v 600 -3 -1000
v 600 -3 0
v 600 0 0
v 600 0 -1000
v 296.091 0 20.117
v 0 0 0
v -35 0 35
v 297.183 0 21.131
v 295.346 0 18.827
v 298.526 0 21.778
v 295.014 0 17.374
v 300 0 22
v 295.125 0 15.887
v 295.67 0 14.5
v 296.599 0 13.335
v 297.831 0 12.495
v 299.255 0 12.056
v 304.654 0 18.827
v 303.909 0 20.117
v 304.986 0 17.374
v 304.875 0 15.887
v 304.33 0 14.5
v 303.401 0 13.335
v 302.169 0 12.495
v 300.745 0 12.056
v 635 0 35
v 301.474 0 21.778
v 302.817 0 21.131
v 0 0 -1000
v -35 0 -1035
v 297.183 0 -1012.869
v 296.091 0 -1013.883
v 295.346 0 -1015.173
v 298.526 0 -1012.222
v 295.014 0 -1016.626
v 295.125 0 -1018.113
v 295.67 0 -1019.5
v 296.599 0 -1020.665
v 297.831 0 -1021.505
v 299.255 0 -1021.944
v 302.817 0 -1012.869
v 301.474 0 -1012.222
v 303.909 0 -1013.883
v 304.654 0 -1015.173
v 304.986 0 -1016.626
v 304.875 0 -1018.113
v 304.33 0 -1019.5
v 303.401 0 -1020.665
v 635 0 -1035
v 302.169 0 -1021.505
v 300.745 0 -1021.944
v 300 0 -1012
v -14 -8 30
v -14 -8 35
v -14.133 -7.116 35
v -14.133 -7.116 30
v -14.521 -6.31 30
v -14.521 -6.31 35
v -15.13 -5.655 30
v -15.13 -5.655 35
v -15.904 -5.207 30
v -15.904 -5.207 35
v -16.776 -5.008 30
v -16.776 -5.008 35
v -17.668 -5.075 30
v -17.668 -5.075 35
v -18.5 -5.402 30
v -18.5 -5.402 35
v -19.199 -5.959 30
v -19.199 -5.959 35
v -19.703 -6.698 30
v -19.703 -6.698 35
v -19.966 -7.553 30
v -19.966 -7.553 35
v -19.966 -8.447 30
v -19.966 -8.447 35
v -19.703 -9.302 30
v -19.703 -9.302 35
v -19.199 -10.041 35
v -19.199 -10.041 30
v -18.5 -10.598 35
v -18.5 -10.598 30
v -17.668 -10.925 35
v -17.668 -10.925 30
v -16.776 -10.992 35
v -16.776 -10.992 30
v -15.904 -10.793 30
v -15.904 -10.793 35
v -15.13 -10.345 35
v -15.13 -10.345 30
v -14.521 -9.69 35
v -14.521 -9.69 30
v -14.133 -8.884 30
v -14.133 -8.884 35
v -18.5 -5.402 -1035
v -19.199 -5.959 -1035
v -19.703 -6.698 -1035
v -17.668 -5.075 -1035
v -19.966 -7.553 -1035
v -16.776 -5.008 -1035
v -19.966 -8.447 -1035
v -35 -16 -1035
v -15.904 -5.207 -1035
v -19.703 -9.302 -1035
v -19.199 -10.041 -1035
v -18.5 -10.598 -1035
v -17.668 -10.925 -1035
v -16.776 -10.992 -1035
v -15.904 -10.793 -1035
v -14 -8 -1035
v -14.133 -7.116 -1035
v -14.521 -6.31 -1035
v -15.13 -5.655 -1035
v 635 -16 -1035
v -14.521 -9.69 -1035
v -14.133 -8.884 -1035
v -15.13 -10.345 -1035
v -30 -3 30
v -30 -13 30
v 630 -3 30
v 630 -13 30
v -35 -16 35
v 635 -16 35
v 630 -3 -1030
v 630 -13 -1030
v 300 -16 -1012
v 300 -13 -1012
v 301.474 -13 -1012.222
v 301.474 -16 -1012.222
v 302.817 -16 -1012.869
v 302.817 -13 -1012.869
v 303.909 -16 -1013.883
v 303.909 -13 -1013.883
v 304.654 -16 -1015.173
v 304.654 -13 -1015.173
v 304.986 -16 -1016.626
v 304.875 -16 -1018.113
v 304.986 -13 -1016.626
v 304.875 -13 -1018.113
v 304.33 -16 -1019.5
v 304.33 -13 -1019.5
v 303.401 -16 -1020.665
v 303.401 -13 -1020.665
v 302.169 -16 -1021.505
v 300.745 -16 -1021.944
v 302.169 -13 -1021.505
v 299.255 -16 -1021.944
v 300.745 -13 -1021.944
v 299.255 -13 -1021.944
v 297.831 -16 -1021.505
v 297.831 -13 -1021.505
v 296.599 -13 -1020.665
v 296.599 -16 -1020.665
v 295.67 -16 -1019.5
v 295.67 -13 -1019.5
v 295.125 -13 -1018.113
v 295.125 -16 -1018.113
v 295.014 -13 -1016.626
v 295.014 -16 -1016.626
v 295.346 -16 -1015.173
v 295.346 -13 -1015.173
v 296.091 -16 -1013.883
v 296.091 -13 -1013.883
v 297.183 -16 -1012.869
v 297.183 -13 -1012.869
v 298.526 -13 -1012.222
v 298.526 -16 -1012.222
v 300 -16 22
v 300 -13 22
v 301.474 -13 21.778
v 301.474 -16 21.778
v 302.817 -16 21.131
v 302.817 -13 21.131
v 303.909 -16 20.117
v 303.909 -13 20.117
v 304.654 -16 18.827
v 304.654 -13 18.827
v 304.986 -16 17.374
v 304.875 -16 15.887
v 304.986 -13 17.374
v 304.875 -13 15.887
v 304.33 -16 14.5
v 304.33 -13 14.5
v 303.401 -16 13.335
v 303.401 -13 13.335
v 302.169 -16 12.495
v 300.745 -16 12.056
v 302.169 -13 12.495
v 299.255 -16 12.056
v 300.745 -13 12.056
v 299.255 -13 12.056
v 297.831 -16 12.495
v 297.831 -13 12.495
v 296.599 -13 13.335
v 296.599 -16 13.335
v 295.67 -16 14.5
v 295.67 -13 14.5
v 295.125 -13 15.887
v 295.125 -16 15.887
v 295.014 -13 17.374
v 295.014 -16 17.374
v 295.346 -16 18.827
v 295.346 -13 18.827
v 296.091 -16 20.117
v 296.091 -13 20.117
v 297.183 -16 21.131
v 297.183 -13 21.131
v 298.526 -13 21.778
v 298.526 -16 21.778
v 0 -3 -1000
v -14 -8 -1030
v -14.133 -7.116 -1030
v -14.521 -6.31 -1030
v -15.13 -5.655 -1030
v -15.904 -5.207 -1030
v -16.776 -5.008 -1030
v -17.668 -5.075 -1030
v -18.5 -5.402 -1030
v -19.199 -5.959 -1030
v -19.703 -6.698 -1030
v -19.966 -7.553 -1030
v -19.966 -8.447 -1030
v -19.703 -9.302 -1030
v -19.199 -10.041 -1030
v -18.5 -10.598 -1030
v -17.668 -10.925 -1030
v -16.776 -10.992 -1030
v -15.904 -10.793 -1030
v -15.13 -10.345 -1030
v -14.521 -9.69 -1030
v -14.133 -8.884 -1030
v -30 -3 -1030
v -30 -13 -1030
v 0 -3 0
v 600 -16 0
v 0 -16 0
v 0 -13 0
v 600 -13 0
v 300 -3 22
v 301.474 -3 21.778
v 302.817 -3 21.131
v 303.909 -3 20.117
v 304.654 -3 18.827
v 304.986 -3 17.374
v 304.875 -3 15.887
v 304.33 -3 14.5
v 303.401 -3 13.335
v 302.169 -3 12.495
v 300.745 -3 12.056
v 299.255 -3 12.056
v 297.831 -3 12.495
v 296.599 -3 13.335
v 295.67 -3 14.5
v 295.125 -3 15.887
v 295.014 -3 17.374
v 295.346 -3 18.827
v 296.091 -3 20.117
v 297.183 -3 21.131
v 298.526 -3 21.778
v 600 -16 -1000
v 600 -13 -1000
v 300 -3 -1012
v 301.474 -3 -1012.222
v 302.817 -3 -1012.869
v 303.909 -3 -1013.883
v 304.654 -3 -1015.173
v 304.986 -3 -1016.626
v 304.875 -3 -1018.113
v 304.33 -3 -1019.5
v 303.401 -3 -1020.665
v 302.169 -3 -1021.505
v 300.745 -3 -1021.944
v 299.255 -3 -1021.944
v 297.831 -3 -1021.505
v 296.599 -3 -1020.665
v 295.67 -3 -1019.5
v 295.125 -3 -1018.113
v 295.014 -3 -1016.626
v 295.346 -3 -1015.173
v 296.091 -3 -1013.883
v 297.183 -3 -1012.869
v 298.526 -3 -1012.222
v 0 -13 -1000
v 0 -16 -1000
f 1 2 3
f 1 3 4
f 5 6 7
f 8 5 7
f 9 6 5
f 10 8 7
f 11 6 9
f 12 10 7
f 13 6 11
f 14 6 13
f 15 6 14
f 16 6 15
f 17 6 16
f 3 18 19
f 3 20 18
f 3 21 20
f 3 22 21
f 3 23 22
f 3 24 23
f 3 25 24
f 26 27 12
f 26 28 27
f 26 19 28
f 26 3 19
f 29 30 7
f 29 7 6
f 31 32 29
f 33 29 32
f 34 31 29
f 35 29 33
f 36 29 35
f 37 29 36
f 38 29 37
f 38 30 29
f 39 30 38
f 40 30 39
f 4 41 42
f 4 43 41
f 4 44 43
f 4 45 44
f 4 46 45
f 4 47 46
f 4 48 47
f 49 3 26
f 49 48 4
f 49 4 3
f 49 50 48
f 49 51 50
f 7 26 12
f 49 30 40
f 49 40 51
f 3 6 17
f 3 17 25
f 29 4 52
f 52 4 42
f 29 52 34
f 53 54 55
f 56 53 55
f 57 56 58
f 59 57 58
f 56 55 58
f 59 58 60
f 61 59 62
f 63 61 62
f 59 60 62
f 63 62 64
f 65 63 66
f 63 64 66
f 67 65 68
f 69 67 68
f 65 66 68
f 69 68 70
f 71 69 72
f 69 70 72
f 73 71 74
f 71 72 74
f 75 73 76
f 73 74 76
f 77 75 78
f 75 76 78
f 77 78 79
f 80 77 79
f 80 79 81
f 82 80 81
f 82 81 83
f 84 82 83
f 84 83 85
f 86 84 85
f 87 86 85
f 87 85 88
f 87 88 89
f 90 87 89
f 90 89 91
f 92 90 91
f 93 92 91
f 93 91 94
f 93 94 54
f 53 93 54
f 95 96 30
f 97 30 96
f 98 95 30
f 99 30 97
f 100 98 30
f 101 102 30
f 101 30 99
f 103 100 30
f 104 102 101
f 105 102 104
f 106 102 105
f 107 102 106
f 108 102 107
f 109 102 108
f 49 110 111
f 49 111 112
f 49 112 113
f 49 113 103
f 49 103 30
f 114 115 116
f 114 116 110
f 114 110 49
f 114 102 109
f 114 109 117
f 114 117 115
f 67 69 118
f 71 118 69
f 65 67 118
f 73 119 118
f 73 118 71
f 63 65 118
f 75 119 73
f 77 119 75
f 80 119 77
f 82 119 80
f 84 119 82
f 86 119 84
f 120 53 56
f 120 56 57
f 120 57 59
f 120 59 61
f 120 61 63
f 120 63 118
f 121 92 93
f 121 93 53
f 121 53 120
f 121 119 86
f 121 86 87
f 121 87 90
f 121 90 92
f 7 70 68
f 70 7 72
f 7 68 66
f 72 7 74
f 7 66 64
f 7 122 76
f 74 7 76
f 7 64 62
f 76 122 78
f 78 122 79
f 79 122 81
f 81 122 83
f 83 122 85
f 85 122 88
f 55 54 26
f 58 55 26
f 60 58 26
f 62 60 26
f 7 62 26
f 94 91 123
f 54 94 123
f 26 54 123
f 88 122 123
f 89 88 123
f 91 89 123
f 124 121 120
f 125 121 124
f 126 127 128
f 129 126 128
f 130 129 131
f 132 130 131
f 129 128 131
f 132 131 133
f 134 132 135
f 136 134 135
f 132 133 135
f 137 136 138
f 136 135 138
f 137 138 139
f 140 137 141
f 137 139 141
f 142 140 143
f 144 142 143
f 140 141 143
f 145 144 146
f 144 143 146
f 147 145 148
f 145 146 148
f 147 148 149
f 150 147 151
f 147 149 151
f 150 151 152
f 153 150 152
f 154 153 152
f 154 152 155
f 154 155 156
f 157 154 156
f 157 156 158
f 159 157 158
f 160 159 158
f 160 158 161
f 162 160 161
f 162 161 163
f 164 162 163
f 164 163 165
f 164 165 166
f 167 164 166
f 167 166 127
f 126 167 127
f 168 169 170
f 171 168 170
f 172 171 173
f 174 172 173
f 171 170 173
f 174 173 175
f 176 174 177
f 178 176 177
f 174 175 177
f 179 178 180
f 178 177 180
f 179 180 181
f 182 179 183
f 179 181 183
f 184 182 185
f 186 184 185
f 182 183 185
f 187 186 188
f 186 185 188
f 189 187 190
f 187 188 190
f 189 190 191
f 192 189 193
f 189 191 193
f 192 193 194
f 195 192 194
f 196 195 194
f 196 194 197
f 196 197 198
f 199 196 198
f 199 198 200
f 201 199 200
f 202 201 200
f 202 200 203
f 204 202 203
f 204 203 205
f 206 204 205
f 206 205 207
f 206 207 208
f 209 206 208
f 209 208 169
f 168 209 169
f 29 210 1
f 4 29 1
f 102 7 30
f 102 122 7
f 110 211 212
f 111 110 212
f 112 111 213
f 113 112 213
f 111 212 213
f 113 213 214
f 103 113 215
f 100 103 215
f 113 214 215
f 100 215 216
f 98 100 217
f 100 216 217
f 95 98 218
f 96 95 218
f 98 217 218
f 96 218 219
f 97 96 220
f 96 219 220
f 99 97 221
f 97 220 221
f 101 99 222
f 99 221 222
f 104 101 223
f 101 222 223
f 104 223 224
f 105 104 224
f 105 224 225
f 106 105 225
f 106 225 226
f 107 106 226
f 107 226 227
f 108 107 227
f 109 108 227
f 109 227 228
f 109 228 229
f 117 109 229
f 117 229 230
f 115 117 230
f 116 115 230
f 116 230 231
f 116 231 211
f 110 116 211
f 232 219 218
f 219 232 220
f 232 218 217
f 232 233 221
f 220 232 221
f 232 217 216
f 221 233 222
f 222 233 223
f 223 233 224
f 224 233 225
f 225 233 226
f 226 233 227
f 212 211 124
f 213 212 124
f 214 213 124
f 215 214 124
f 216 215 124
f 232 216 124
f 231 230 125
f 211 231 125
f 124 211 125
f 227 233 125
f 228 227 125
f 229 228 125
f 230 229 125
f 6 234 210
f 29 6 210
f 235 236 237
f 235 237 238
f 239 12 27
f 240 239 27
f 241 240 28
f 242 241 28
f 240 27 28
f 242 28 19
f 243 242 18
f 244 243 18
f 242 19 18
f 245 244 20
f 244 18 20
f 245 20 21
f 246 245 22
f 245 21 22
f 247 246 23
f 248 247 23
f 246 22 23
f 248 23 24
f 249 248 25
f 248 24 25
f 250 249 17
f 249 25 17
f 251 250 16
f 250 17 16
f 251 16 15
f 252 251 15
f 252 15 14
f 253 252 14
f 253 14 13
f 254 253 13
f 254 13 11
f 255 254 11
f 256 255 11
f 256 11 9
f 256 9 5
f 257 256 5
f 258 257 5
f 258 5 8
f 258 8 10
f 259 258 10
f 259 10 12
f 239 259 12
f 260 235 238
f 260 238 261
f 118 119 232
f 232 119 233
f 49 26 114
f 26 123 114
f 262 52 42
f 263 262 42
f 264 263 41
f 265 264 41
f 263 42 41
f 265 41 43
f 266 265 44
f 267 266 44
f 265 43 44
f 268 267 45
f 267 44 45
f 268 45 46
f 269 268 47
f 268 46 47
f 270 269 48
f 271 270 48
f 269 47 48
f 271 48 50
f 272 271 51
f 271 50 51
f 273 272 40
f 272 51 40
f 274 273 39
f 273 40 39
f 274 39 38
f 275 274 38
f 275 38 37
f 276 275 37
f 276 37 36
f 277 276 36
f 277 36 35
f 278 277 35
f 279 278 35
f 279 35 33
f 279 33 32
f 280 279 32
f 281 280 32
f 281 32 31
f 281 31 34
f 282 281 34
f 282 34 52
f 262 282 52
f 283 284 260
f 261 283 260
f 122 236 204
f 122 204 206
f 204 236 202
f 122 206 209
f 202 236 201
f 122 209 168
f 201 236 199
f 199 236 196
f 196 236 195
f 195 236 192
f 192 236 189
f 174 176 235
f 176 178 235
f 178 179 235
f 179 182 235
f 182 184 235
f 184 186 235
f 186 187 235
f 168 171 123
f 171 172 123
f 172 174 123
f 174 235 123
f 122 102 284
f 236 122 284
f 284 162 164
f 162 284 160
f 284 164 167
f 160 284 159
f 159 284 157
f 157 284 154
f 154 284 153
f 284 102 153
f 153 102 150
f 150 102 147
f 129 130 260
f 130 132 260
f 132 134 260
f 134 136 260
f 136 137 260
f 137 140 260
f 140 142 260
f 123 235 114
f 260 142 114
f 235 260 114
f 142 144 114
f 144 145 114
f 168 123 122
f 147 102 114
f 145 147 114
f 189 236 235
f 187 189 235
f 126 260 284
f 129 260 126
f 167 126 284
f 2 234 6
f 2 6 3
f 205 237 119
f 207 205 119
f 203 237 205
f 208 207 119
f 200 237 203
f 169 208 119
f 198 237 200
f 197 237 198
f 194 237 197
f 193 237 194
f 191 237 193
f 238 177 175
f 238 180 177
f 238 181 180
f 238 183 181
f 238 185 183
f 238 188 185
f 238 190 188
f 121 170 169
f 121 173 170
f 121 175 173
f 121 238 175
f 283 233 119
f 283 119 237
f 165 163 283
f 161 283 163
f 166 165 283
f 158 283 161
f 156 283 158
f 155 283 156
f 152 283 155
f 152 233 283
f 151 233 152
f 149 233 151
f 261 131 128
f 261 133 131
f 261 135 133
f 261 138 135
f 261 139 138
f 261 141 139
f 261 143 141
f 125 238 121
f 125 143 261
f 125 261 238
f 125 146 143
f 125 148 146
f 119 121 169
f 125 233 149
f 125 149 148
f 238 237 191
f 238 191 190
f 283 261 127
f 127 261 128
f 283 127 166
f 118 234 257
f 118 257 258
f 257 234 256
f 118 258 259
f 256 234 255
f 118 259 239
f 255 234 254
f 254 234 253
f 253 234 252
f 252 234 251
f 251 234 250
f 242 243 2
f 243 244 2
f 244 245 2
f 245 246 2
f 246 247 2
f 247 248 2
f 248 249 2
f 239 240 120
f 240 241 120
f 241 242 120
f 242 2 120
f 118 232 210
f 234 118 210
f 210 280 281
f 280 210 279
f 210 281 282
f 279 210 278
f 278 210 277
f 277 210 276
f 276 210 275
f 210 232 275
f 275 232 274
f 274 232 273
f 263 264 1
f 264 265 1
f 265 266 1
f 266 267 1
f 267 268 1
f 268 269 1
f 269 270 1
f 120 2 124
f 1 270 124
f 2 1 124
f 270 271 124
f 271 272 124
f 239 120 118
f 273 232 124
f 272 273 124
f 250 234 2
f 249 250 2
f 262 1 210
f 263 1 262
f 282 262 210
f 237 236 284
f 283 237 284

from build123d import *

# Parameters (mm, degrees)
SWEEP_START           = -16
SWEEP_1_OUTLINE_W     = 670
SWEEP_1_OUTLINE_H     = 1070
SWEEP_1_OUTLINE_W_2   = 600
SWEEP_1_OUTLINE_H_2   = 1000
SWEEP_1_DEPTH         = 3
SWEEP_START_2         = -3
SWEEP_1_2_OUTLINE_W   = 670
SWEEP_1_2_OUTLINE_H   = 1070
SWEEP_1_2_OUTLINE_W_2 = 600
SWEEP_1_2_OUTLINE_H_2 = 1000
SWEEP_1_2_DEPTH       = 3
SWEEP_START_3         = -13
SWEEP_1_3_OUTLINE_W   = 670
SWEEP_1_3_OUTLINE_H   = 1070
SWEEP_1_3_OUTLINE_W_2 = 660
SWEEP_1_3_OUTLINE_H_2 = 1060
SWEEP_1_3_DEPTH       = 10
SKETCH_16_R           = 3
CUT_EXTRUDE_1_DEPTH   = 1245.339583876
SKETCH_17_R           = 5
CUT_EXTRUDE_2_DEPTH   = 1215.374736233


# Read off the part's stored shape, not the designer's step: 扫描1
with BuildPart() as part:
    # 扫描1 outline → 扫描1 (new body)
    with BuildSketch(Plane(origin=(0, 0, 0), x_dir=(1, 0, 0), z_dir=(0, 1, 0)).offset(SWEEP_START)):
        with Locations((300, 500)):
            Rectangle(SWEEP_1_OUTLINE_W, SWEEP_1_OUTLINE_H)
        with Locations((300, 500)):
            Rectangle(SWEEP_1_OUTLINE_W_2, SWEEP_1_OUTLINE_H_2, mode=Mode.SUBTRACT)
    extrude(amount=SWEEP_1_DEPTH)



with BuildPart() as body_2:
    # Sweep 1 2 outline → Sweep 1 2 (new body)
    with BuildSketch(Plane(origin=(0, 0, 0), x_dir=(1, 0, 0), z_dir=(0, 1, 0)).offset(SWEEP_START_2)):
        with Locations((300, 500)):
            Rectangle(SWEEP_1_2_OUTLINE_W, SWEEP_1_2_OUTLINE_H)
        with Locations((300, 500)):
            Rectangle(SWEEP_1_2_OUTLINE_W_2, SWEEP_1_2_OUTLINE_H_2, mode=Mode.SUBTRACT)
    extrude(amount=SWEEP_1_2_DEPTH)


with BuildPart() as part_1:
    add(part.part)

    add(body_2.part)  # Sweep 1 3 merges body 2
    # Sweep 1 3 outline → Sweep 1 3 (add)
    with BuildSketch(Plane(origin=(0, 0, 0), x_dir=(1, 0, 0), z_dir=(0, 1, 0)).offset(SWEEP_START_3)):
        with Locations((300, 500)):
            Rectangle(SWEEP_1_3_OUTLINE_W, SWEEP_1_3_OUTLINE_H)
        with Locations((300, 500)):
            Rectangle(SWEEP_1_3_OUTLINE_W_2, SWEEP_1_3_OUTLINE_H_2, mode=Mode.SUBTRACT)
    extrude(amount=SWEEP_1_3_DEPTH)

    # 草图16 → 切除-拉伸1 (cut, through all)
    with BuildSketch(Plane.XY.offset(35)):
        with Locations((-17, -8)):
            Circle(SKETCH_16_R)
    extrude(amount=-CUT_EXTRUDE_1_DEPTH, mode=Mode.SUBTRACT)

    # 草图17 → 切除-拉伸2 (cut, through all)
    with BuildSketch(Plane(origin=(0, 0, 0), x_dir=(1, 0, 0), z_dir=(0, 1, 0))):
        with Locations(Location((300, 1017, 0), (0, 0, 270))):
            Circle(SKETCH_17_R)
        with Locations(Location((300, -17, 0), (0, 0, 270))):
            Circle(SKETCH_17_R)
    extrude(amount=-CUT_EXTRUDE_2_DEPTH, mode=Mode.SUBTRACT)


solid = part_1.part
